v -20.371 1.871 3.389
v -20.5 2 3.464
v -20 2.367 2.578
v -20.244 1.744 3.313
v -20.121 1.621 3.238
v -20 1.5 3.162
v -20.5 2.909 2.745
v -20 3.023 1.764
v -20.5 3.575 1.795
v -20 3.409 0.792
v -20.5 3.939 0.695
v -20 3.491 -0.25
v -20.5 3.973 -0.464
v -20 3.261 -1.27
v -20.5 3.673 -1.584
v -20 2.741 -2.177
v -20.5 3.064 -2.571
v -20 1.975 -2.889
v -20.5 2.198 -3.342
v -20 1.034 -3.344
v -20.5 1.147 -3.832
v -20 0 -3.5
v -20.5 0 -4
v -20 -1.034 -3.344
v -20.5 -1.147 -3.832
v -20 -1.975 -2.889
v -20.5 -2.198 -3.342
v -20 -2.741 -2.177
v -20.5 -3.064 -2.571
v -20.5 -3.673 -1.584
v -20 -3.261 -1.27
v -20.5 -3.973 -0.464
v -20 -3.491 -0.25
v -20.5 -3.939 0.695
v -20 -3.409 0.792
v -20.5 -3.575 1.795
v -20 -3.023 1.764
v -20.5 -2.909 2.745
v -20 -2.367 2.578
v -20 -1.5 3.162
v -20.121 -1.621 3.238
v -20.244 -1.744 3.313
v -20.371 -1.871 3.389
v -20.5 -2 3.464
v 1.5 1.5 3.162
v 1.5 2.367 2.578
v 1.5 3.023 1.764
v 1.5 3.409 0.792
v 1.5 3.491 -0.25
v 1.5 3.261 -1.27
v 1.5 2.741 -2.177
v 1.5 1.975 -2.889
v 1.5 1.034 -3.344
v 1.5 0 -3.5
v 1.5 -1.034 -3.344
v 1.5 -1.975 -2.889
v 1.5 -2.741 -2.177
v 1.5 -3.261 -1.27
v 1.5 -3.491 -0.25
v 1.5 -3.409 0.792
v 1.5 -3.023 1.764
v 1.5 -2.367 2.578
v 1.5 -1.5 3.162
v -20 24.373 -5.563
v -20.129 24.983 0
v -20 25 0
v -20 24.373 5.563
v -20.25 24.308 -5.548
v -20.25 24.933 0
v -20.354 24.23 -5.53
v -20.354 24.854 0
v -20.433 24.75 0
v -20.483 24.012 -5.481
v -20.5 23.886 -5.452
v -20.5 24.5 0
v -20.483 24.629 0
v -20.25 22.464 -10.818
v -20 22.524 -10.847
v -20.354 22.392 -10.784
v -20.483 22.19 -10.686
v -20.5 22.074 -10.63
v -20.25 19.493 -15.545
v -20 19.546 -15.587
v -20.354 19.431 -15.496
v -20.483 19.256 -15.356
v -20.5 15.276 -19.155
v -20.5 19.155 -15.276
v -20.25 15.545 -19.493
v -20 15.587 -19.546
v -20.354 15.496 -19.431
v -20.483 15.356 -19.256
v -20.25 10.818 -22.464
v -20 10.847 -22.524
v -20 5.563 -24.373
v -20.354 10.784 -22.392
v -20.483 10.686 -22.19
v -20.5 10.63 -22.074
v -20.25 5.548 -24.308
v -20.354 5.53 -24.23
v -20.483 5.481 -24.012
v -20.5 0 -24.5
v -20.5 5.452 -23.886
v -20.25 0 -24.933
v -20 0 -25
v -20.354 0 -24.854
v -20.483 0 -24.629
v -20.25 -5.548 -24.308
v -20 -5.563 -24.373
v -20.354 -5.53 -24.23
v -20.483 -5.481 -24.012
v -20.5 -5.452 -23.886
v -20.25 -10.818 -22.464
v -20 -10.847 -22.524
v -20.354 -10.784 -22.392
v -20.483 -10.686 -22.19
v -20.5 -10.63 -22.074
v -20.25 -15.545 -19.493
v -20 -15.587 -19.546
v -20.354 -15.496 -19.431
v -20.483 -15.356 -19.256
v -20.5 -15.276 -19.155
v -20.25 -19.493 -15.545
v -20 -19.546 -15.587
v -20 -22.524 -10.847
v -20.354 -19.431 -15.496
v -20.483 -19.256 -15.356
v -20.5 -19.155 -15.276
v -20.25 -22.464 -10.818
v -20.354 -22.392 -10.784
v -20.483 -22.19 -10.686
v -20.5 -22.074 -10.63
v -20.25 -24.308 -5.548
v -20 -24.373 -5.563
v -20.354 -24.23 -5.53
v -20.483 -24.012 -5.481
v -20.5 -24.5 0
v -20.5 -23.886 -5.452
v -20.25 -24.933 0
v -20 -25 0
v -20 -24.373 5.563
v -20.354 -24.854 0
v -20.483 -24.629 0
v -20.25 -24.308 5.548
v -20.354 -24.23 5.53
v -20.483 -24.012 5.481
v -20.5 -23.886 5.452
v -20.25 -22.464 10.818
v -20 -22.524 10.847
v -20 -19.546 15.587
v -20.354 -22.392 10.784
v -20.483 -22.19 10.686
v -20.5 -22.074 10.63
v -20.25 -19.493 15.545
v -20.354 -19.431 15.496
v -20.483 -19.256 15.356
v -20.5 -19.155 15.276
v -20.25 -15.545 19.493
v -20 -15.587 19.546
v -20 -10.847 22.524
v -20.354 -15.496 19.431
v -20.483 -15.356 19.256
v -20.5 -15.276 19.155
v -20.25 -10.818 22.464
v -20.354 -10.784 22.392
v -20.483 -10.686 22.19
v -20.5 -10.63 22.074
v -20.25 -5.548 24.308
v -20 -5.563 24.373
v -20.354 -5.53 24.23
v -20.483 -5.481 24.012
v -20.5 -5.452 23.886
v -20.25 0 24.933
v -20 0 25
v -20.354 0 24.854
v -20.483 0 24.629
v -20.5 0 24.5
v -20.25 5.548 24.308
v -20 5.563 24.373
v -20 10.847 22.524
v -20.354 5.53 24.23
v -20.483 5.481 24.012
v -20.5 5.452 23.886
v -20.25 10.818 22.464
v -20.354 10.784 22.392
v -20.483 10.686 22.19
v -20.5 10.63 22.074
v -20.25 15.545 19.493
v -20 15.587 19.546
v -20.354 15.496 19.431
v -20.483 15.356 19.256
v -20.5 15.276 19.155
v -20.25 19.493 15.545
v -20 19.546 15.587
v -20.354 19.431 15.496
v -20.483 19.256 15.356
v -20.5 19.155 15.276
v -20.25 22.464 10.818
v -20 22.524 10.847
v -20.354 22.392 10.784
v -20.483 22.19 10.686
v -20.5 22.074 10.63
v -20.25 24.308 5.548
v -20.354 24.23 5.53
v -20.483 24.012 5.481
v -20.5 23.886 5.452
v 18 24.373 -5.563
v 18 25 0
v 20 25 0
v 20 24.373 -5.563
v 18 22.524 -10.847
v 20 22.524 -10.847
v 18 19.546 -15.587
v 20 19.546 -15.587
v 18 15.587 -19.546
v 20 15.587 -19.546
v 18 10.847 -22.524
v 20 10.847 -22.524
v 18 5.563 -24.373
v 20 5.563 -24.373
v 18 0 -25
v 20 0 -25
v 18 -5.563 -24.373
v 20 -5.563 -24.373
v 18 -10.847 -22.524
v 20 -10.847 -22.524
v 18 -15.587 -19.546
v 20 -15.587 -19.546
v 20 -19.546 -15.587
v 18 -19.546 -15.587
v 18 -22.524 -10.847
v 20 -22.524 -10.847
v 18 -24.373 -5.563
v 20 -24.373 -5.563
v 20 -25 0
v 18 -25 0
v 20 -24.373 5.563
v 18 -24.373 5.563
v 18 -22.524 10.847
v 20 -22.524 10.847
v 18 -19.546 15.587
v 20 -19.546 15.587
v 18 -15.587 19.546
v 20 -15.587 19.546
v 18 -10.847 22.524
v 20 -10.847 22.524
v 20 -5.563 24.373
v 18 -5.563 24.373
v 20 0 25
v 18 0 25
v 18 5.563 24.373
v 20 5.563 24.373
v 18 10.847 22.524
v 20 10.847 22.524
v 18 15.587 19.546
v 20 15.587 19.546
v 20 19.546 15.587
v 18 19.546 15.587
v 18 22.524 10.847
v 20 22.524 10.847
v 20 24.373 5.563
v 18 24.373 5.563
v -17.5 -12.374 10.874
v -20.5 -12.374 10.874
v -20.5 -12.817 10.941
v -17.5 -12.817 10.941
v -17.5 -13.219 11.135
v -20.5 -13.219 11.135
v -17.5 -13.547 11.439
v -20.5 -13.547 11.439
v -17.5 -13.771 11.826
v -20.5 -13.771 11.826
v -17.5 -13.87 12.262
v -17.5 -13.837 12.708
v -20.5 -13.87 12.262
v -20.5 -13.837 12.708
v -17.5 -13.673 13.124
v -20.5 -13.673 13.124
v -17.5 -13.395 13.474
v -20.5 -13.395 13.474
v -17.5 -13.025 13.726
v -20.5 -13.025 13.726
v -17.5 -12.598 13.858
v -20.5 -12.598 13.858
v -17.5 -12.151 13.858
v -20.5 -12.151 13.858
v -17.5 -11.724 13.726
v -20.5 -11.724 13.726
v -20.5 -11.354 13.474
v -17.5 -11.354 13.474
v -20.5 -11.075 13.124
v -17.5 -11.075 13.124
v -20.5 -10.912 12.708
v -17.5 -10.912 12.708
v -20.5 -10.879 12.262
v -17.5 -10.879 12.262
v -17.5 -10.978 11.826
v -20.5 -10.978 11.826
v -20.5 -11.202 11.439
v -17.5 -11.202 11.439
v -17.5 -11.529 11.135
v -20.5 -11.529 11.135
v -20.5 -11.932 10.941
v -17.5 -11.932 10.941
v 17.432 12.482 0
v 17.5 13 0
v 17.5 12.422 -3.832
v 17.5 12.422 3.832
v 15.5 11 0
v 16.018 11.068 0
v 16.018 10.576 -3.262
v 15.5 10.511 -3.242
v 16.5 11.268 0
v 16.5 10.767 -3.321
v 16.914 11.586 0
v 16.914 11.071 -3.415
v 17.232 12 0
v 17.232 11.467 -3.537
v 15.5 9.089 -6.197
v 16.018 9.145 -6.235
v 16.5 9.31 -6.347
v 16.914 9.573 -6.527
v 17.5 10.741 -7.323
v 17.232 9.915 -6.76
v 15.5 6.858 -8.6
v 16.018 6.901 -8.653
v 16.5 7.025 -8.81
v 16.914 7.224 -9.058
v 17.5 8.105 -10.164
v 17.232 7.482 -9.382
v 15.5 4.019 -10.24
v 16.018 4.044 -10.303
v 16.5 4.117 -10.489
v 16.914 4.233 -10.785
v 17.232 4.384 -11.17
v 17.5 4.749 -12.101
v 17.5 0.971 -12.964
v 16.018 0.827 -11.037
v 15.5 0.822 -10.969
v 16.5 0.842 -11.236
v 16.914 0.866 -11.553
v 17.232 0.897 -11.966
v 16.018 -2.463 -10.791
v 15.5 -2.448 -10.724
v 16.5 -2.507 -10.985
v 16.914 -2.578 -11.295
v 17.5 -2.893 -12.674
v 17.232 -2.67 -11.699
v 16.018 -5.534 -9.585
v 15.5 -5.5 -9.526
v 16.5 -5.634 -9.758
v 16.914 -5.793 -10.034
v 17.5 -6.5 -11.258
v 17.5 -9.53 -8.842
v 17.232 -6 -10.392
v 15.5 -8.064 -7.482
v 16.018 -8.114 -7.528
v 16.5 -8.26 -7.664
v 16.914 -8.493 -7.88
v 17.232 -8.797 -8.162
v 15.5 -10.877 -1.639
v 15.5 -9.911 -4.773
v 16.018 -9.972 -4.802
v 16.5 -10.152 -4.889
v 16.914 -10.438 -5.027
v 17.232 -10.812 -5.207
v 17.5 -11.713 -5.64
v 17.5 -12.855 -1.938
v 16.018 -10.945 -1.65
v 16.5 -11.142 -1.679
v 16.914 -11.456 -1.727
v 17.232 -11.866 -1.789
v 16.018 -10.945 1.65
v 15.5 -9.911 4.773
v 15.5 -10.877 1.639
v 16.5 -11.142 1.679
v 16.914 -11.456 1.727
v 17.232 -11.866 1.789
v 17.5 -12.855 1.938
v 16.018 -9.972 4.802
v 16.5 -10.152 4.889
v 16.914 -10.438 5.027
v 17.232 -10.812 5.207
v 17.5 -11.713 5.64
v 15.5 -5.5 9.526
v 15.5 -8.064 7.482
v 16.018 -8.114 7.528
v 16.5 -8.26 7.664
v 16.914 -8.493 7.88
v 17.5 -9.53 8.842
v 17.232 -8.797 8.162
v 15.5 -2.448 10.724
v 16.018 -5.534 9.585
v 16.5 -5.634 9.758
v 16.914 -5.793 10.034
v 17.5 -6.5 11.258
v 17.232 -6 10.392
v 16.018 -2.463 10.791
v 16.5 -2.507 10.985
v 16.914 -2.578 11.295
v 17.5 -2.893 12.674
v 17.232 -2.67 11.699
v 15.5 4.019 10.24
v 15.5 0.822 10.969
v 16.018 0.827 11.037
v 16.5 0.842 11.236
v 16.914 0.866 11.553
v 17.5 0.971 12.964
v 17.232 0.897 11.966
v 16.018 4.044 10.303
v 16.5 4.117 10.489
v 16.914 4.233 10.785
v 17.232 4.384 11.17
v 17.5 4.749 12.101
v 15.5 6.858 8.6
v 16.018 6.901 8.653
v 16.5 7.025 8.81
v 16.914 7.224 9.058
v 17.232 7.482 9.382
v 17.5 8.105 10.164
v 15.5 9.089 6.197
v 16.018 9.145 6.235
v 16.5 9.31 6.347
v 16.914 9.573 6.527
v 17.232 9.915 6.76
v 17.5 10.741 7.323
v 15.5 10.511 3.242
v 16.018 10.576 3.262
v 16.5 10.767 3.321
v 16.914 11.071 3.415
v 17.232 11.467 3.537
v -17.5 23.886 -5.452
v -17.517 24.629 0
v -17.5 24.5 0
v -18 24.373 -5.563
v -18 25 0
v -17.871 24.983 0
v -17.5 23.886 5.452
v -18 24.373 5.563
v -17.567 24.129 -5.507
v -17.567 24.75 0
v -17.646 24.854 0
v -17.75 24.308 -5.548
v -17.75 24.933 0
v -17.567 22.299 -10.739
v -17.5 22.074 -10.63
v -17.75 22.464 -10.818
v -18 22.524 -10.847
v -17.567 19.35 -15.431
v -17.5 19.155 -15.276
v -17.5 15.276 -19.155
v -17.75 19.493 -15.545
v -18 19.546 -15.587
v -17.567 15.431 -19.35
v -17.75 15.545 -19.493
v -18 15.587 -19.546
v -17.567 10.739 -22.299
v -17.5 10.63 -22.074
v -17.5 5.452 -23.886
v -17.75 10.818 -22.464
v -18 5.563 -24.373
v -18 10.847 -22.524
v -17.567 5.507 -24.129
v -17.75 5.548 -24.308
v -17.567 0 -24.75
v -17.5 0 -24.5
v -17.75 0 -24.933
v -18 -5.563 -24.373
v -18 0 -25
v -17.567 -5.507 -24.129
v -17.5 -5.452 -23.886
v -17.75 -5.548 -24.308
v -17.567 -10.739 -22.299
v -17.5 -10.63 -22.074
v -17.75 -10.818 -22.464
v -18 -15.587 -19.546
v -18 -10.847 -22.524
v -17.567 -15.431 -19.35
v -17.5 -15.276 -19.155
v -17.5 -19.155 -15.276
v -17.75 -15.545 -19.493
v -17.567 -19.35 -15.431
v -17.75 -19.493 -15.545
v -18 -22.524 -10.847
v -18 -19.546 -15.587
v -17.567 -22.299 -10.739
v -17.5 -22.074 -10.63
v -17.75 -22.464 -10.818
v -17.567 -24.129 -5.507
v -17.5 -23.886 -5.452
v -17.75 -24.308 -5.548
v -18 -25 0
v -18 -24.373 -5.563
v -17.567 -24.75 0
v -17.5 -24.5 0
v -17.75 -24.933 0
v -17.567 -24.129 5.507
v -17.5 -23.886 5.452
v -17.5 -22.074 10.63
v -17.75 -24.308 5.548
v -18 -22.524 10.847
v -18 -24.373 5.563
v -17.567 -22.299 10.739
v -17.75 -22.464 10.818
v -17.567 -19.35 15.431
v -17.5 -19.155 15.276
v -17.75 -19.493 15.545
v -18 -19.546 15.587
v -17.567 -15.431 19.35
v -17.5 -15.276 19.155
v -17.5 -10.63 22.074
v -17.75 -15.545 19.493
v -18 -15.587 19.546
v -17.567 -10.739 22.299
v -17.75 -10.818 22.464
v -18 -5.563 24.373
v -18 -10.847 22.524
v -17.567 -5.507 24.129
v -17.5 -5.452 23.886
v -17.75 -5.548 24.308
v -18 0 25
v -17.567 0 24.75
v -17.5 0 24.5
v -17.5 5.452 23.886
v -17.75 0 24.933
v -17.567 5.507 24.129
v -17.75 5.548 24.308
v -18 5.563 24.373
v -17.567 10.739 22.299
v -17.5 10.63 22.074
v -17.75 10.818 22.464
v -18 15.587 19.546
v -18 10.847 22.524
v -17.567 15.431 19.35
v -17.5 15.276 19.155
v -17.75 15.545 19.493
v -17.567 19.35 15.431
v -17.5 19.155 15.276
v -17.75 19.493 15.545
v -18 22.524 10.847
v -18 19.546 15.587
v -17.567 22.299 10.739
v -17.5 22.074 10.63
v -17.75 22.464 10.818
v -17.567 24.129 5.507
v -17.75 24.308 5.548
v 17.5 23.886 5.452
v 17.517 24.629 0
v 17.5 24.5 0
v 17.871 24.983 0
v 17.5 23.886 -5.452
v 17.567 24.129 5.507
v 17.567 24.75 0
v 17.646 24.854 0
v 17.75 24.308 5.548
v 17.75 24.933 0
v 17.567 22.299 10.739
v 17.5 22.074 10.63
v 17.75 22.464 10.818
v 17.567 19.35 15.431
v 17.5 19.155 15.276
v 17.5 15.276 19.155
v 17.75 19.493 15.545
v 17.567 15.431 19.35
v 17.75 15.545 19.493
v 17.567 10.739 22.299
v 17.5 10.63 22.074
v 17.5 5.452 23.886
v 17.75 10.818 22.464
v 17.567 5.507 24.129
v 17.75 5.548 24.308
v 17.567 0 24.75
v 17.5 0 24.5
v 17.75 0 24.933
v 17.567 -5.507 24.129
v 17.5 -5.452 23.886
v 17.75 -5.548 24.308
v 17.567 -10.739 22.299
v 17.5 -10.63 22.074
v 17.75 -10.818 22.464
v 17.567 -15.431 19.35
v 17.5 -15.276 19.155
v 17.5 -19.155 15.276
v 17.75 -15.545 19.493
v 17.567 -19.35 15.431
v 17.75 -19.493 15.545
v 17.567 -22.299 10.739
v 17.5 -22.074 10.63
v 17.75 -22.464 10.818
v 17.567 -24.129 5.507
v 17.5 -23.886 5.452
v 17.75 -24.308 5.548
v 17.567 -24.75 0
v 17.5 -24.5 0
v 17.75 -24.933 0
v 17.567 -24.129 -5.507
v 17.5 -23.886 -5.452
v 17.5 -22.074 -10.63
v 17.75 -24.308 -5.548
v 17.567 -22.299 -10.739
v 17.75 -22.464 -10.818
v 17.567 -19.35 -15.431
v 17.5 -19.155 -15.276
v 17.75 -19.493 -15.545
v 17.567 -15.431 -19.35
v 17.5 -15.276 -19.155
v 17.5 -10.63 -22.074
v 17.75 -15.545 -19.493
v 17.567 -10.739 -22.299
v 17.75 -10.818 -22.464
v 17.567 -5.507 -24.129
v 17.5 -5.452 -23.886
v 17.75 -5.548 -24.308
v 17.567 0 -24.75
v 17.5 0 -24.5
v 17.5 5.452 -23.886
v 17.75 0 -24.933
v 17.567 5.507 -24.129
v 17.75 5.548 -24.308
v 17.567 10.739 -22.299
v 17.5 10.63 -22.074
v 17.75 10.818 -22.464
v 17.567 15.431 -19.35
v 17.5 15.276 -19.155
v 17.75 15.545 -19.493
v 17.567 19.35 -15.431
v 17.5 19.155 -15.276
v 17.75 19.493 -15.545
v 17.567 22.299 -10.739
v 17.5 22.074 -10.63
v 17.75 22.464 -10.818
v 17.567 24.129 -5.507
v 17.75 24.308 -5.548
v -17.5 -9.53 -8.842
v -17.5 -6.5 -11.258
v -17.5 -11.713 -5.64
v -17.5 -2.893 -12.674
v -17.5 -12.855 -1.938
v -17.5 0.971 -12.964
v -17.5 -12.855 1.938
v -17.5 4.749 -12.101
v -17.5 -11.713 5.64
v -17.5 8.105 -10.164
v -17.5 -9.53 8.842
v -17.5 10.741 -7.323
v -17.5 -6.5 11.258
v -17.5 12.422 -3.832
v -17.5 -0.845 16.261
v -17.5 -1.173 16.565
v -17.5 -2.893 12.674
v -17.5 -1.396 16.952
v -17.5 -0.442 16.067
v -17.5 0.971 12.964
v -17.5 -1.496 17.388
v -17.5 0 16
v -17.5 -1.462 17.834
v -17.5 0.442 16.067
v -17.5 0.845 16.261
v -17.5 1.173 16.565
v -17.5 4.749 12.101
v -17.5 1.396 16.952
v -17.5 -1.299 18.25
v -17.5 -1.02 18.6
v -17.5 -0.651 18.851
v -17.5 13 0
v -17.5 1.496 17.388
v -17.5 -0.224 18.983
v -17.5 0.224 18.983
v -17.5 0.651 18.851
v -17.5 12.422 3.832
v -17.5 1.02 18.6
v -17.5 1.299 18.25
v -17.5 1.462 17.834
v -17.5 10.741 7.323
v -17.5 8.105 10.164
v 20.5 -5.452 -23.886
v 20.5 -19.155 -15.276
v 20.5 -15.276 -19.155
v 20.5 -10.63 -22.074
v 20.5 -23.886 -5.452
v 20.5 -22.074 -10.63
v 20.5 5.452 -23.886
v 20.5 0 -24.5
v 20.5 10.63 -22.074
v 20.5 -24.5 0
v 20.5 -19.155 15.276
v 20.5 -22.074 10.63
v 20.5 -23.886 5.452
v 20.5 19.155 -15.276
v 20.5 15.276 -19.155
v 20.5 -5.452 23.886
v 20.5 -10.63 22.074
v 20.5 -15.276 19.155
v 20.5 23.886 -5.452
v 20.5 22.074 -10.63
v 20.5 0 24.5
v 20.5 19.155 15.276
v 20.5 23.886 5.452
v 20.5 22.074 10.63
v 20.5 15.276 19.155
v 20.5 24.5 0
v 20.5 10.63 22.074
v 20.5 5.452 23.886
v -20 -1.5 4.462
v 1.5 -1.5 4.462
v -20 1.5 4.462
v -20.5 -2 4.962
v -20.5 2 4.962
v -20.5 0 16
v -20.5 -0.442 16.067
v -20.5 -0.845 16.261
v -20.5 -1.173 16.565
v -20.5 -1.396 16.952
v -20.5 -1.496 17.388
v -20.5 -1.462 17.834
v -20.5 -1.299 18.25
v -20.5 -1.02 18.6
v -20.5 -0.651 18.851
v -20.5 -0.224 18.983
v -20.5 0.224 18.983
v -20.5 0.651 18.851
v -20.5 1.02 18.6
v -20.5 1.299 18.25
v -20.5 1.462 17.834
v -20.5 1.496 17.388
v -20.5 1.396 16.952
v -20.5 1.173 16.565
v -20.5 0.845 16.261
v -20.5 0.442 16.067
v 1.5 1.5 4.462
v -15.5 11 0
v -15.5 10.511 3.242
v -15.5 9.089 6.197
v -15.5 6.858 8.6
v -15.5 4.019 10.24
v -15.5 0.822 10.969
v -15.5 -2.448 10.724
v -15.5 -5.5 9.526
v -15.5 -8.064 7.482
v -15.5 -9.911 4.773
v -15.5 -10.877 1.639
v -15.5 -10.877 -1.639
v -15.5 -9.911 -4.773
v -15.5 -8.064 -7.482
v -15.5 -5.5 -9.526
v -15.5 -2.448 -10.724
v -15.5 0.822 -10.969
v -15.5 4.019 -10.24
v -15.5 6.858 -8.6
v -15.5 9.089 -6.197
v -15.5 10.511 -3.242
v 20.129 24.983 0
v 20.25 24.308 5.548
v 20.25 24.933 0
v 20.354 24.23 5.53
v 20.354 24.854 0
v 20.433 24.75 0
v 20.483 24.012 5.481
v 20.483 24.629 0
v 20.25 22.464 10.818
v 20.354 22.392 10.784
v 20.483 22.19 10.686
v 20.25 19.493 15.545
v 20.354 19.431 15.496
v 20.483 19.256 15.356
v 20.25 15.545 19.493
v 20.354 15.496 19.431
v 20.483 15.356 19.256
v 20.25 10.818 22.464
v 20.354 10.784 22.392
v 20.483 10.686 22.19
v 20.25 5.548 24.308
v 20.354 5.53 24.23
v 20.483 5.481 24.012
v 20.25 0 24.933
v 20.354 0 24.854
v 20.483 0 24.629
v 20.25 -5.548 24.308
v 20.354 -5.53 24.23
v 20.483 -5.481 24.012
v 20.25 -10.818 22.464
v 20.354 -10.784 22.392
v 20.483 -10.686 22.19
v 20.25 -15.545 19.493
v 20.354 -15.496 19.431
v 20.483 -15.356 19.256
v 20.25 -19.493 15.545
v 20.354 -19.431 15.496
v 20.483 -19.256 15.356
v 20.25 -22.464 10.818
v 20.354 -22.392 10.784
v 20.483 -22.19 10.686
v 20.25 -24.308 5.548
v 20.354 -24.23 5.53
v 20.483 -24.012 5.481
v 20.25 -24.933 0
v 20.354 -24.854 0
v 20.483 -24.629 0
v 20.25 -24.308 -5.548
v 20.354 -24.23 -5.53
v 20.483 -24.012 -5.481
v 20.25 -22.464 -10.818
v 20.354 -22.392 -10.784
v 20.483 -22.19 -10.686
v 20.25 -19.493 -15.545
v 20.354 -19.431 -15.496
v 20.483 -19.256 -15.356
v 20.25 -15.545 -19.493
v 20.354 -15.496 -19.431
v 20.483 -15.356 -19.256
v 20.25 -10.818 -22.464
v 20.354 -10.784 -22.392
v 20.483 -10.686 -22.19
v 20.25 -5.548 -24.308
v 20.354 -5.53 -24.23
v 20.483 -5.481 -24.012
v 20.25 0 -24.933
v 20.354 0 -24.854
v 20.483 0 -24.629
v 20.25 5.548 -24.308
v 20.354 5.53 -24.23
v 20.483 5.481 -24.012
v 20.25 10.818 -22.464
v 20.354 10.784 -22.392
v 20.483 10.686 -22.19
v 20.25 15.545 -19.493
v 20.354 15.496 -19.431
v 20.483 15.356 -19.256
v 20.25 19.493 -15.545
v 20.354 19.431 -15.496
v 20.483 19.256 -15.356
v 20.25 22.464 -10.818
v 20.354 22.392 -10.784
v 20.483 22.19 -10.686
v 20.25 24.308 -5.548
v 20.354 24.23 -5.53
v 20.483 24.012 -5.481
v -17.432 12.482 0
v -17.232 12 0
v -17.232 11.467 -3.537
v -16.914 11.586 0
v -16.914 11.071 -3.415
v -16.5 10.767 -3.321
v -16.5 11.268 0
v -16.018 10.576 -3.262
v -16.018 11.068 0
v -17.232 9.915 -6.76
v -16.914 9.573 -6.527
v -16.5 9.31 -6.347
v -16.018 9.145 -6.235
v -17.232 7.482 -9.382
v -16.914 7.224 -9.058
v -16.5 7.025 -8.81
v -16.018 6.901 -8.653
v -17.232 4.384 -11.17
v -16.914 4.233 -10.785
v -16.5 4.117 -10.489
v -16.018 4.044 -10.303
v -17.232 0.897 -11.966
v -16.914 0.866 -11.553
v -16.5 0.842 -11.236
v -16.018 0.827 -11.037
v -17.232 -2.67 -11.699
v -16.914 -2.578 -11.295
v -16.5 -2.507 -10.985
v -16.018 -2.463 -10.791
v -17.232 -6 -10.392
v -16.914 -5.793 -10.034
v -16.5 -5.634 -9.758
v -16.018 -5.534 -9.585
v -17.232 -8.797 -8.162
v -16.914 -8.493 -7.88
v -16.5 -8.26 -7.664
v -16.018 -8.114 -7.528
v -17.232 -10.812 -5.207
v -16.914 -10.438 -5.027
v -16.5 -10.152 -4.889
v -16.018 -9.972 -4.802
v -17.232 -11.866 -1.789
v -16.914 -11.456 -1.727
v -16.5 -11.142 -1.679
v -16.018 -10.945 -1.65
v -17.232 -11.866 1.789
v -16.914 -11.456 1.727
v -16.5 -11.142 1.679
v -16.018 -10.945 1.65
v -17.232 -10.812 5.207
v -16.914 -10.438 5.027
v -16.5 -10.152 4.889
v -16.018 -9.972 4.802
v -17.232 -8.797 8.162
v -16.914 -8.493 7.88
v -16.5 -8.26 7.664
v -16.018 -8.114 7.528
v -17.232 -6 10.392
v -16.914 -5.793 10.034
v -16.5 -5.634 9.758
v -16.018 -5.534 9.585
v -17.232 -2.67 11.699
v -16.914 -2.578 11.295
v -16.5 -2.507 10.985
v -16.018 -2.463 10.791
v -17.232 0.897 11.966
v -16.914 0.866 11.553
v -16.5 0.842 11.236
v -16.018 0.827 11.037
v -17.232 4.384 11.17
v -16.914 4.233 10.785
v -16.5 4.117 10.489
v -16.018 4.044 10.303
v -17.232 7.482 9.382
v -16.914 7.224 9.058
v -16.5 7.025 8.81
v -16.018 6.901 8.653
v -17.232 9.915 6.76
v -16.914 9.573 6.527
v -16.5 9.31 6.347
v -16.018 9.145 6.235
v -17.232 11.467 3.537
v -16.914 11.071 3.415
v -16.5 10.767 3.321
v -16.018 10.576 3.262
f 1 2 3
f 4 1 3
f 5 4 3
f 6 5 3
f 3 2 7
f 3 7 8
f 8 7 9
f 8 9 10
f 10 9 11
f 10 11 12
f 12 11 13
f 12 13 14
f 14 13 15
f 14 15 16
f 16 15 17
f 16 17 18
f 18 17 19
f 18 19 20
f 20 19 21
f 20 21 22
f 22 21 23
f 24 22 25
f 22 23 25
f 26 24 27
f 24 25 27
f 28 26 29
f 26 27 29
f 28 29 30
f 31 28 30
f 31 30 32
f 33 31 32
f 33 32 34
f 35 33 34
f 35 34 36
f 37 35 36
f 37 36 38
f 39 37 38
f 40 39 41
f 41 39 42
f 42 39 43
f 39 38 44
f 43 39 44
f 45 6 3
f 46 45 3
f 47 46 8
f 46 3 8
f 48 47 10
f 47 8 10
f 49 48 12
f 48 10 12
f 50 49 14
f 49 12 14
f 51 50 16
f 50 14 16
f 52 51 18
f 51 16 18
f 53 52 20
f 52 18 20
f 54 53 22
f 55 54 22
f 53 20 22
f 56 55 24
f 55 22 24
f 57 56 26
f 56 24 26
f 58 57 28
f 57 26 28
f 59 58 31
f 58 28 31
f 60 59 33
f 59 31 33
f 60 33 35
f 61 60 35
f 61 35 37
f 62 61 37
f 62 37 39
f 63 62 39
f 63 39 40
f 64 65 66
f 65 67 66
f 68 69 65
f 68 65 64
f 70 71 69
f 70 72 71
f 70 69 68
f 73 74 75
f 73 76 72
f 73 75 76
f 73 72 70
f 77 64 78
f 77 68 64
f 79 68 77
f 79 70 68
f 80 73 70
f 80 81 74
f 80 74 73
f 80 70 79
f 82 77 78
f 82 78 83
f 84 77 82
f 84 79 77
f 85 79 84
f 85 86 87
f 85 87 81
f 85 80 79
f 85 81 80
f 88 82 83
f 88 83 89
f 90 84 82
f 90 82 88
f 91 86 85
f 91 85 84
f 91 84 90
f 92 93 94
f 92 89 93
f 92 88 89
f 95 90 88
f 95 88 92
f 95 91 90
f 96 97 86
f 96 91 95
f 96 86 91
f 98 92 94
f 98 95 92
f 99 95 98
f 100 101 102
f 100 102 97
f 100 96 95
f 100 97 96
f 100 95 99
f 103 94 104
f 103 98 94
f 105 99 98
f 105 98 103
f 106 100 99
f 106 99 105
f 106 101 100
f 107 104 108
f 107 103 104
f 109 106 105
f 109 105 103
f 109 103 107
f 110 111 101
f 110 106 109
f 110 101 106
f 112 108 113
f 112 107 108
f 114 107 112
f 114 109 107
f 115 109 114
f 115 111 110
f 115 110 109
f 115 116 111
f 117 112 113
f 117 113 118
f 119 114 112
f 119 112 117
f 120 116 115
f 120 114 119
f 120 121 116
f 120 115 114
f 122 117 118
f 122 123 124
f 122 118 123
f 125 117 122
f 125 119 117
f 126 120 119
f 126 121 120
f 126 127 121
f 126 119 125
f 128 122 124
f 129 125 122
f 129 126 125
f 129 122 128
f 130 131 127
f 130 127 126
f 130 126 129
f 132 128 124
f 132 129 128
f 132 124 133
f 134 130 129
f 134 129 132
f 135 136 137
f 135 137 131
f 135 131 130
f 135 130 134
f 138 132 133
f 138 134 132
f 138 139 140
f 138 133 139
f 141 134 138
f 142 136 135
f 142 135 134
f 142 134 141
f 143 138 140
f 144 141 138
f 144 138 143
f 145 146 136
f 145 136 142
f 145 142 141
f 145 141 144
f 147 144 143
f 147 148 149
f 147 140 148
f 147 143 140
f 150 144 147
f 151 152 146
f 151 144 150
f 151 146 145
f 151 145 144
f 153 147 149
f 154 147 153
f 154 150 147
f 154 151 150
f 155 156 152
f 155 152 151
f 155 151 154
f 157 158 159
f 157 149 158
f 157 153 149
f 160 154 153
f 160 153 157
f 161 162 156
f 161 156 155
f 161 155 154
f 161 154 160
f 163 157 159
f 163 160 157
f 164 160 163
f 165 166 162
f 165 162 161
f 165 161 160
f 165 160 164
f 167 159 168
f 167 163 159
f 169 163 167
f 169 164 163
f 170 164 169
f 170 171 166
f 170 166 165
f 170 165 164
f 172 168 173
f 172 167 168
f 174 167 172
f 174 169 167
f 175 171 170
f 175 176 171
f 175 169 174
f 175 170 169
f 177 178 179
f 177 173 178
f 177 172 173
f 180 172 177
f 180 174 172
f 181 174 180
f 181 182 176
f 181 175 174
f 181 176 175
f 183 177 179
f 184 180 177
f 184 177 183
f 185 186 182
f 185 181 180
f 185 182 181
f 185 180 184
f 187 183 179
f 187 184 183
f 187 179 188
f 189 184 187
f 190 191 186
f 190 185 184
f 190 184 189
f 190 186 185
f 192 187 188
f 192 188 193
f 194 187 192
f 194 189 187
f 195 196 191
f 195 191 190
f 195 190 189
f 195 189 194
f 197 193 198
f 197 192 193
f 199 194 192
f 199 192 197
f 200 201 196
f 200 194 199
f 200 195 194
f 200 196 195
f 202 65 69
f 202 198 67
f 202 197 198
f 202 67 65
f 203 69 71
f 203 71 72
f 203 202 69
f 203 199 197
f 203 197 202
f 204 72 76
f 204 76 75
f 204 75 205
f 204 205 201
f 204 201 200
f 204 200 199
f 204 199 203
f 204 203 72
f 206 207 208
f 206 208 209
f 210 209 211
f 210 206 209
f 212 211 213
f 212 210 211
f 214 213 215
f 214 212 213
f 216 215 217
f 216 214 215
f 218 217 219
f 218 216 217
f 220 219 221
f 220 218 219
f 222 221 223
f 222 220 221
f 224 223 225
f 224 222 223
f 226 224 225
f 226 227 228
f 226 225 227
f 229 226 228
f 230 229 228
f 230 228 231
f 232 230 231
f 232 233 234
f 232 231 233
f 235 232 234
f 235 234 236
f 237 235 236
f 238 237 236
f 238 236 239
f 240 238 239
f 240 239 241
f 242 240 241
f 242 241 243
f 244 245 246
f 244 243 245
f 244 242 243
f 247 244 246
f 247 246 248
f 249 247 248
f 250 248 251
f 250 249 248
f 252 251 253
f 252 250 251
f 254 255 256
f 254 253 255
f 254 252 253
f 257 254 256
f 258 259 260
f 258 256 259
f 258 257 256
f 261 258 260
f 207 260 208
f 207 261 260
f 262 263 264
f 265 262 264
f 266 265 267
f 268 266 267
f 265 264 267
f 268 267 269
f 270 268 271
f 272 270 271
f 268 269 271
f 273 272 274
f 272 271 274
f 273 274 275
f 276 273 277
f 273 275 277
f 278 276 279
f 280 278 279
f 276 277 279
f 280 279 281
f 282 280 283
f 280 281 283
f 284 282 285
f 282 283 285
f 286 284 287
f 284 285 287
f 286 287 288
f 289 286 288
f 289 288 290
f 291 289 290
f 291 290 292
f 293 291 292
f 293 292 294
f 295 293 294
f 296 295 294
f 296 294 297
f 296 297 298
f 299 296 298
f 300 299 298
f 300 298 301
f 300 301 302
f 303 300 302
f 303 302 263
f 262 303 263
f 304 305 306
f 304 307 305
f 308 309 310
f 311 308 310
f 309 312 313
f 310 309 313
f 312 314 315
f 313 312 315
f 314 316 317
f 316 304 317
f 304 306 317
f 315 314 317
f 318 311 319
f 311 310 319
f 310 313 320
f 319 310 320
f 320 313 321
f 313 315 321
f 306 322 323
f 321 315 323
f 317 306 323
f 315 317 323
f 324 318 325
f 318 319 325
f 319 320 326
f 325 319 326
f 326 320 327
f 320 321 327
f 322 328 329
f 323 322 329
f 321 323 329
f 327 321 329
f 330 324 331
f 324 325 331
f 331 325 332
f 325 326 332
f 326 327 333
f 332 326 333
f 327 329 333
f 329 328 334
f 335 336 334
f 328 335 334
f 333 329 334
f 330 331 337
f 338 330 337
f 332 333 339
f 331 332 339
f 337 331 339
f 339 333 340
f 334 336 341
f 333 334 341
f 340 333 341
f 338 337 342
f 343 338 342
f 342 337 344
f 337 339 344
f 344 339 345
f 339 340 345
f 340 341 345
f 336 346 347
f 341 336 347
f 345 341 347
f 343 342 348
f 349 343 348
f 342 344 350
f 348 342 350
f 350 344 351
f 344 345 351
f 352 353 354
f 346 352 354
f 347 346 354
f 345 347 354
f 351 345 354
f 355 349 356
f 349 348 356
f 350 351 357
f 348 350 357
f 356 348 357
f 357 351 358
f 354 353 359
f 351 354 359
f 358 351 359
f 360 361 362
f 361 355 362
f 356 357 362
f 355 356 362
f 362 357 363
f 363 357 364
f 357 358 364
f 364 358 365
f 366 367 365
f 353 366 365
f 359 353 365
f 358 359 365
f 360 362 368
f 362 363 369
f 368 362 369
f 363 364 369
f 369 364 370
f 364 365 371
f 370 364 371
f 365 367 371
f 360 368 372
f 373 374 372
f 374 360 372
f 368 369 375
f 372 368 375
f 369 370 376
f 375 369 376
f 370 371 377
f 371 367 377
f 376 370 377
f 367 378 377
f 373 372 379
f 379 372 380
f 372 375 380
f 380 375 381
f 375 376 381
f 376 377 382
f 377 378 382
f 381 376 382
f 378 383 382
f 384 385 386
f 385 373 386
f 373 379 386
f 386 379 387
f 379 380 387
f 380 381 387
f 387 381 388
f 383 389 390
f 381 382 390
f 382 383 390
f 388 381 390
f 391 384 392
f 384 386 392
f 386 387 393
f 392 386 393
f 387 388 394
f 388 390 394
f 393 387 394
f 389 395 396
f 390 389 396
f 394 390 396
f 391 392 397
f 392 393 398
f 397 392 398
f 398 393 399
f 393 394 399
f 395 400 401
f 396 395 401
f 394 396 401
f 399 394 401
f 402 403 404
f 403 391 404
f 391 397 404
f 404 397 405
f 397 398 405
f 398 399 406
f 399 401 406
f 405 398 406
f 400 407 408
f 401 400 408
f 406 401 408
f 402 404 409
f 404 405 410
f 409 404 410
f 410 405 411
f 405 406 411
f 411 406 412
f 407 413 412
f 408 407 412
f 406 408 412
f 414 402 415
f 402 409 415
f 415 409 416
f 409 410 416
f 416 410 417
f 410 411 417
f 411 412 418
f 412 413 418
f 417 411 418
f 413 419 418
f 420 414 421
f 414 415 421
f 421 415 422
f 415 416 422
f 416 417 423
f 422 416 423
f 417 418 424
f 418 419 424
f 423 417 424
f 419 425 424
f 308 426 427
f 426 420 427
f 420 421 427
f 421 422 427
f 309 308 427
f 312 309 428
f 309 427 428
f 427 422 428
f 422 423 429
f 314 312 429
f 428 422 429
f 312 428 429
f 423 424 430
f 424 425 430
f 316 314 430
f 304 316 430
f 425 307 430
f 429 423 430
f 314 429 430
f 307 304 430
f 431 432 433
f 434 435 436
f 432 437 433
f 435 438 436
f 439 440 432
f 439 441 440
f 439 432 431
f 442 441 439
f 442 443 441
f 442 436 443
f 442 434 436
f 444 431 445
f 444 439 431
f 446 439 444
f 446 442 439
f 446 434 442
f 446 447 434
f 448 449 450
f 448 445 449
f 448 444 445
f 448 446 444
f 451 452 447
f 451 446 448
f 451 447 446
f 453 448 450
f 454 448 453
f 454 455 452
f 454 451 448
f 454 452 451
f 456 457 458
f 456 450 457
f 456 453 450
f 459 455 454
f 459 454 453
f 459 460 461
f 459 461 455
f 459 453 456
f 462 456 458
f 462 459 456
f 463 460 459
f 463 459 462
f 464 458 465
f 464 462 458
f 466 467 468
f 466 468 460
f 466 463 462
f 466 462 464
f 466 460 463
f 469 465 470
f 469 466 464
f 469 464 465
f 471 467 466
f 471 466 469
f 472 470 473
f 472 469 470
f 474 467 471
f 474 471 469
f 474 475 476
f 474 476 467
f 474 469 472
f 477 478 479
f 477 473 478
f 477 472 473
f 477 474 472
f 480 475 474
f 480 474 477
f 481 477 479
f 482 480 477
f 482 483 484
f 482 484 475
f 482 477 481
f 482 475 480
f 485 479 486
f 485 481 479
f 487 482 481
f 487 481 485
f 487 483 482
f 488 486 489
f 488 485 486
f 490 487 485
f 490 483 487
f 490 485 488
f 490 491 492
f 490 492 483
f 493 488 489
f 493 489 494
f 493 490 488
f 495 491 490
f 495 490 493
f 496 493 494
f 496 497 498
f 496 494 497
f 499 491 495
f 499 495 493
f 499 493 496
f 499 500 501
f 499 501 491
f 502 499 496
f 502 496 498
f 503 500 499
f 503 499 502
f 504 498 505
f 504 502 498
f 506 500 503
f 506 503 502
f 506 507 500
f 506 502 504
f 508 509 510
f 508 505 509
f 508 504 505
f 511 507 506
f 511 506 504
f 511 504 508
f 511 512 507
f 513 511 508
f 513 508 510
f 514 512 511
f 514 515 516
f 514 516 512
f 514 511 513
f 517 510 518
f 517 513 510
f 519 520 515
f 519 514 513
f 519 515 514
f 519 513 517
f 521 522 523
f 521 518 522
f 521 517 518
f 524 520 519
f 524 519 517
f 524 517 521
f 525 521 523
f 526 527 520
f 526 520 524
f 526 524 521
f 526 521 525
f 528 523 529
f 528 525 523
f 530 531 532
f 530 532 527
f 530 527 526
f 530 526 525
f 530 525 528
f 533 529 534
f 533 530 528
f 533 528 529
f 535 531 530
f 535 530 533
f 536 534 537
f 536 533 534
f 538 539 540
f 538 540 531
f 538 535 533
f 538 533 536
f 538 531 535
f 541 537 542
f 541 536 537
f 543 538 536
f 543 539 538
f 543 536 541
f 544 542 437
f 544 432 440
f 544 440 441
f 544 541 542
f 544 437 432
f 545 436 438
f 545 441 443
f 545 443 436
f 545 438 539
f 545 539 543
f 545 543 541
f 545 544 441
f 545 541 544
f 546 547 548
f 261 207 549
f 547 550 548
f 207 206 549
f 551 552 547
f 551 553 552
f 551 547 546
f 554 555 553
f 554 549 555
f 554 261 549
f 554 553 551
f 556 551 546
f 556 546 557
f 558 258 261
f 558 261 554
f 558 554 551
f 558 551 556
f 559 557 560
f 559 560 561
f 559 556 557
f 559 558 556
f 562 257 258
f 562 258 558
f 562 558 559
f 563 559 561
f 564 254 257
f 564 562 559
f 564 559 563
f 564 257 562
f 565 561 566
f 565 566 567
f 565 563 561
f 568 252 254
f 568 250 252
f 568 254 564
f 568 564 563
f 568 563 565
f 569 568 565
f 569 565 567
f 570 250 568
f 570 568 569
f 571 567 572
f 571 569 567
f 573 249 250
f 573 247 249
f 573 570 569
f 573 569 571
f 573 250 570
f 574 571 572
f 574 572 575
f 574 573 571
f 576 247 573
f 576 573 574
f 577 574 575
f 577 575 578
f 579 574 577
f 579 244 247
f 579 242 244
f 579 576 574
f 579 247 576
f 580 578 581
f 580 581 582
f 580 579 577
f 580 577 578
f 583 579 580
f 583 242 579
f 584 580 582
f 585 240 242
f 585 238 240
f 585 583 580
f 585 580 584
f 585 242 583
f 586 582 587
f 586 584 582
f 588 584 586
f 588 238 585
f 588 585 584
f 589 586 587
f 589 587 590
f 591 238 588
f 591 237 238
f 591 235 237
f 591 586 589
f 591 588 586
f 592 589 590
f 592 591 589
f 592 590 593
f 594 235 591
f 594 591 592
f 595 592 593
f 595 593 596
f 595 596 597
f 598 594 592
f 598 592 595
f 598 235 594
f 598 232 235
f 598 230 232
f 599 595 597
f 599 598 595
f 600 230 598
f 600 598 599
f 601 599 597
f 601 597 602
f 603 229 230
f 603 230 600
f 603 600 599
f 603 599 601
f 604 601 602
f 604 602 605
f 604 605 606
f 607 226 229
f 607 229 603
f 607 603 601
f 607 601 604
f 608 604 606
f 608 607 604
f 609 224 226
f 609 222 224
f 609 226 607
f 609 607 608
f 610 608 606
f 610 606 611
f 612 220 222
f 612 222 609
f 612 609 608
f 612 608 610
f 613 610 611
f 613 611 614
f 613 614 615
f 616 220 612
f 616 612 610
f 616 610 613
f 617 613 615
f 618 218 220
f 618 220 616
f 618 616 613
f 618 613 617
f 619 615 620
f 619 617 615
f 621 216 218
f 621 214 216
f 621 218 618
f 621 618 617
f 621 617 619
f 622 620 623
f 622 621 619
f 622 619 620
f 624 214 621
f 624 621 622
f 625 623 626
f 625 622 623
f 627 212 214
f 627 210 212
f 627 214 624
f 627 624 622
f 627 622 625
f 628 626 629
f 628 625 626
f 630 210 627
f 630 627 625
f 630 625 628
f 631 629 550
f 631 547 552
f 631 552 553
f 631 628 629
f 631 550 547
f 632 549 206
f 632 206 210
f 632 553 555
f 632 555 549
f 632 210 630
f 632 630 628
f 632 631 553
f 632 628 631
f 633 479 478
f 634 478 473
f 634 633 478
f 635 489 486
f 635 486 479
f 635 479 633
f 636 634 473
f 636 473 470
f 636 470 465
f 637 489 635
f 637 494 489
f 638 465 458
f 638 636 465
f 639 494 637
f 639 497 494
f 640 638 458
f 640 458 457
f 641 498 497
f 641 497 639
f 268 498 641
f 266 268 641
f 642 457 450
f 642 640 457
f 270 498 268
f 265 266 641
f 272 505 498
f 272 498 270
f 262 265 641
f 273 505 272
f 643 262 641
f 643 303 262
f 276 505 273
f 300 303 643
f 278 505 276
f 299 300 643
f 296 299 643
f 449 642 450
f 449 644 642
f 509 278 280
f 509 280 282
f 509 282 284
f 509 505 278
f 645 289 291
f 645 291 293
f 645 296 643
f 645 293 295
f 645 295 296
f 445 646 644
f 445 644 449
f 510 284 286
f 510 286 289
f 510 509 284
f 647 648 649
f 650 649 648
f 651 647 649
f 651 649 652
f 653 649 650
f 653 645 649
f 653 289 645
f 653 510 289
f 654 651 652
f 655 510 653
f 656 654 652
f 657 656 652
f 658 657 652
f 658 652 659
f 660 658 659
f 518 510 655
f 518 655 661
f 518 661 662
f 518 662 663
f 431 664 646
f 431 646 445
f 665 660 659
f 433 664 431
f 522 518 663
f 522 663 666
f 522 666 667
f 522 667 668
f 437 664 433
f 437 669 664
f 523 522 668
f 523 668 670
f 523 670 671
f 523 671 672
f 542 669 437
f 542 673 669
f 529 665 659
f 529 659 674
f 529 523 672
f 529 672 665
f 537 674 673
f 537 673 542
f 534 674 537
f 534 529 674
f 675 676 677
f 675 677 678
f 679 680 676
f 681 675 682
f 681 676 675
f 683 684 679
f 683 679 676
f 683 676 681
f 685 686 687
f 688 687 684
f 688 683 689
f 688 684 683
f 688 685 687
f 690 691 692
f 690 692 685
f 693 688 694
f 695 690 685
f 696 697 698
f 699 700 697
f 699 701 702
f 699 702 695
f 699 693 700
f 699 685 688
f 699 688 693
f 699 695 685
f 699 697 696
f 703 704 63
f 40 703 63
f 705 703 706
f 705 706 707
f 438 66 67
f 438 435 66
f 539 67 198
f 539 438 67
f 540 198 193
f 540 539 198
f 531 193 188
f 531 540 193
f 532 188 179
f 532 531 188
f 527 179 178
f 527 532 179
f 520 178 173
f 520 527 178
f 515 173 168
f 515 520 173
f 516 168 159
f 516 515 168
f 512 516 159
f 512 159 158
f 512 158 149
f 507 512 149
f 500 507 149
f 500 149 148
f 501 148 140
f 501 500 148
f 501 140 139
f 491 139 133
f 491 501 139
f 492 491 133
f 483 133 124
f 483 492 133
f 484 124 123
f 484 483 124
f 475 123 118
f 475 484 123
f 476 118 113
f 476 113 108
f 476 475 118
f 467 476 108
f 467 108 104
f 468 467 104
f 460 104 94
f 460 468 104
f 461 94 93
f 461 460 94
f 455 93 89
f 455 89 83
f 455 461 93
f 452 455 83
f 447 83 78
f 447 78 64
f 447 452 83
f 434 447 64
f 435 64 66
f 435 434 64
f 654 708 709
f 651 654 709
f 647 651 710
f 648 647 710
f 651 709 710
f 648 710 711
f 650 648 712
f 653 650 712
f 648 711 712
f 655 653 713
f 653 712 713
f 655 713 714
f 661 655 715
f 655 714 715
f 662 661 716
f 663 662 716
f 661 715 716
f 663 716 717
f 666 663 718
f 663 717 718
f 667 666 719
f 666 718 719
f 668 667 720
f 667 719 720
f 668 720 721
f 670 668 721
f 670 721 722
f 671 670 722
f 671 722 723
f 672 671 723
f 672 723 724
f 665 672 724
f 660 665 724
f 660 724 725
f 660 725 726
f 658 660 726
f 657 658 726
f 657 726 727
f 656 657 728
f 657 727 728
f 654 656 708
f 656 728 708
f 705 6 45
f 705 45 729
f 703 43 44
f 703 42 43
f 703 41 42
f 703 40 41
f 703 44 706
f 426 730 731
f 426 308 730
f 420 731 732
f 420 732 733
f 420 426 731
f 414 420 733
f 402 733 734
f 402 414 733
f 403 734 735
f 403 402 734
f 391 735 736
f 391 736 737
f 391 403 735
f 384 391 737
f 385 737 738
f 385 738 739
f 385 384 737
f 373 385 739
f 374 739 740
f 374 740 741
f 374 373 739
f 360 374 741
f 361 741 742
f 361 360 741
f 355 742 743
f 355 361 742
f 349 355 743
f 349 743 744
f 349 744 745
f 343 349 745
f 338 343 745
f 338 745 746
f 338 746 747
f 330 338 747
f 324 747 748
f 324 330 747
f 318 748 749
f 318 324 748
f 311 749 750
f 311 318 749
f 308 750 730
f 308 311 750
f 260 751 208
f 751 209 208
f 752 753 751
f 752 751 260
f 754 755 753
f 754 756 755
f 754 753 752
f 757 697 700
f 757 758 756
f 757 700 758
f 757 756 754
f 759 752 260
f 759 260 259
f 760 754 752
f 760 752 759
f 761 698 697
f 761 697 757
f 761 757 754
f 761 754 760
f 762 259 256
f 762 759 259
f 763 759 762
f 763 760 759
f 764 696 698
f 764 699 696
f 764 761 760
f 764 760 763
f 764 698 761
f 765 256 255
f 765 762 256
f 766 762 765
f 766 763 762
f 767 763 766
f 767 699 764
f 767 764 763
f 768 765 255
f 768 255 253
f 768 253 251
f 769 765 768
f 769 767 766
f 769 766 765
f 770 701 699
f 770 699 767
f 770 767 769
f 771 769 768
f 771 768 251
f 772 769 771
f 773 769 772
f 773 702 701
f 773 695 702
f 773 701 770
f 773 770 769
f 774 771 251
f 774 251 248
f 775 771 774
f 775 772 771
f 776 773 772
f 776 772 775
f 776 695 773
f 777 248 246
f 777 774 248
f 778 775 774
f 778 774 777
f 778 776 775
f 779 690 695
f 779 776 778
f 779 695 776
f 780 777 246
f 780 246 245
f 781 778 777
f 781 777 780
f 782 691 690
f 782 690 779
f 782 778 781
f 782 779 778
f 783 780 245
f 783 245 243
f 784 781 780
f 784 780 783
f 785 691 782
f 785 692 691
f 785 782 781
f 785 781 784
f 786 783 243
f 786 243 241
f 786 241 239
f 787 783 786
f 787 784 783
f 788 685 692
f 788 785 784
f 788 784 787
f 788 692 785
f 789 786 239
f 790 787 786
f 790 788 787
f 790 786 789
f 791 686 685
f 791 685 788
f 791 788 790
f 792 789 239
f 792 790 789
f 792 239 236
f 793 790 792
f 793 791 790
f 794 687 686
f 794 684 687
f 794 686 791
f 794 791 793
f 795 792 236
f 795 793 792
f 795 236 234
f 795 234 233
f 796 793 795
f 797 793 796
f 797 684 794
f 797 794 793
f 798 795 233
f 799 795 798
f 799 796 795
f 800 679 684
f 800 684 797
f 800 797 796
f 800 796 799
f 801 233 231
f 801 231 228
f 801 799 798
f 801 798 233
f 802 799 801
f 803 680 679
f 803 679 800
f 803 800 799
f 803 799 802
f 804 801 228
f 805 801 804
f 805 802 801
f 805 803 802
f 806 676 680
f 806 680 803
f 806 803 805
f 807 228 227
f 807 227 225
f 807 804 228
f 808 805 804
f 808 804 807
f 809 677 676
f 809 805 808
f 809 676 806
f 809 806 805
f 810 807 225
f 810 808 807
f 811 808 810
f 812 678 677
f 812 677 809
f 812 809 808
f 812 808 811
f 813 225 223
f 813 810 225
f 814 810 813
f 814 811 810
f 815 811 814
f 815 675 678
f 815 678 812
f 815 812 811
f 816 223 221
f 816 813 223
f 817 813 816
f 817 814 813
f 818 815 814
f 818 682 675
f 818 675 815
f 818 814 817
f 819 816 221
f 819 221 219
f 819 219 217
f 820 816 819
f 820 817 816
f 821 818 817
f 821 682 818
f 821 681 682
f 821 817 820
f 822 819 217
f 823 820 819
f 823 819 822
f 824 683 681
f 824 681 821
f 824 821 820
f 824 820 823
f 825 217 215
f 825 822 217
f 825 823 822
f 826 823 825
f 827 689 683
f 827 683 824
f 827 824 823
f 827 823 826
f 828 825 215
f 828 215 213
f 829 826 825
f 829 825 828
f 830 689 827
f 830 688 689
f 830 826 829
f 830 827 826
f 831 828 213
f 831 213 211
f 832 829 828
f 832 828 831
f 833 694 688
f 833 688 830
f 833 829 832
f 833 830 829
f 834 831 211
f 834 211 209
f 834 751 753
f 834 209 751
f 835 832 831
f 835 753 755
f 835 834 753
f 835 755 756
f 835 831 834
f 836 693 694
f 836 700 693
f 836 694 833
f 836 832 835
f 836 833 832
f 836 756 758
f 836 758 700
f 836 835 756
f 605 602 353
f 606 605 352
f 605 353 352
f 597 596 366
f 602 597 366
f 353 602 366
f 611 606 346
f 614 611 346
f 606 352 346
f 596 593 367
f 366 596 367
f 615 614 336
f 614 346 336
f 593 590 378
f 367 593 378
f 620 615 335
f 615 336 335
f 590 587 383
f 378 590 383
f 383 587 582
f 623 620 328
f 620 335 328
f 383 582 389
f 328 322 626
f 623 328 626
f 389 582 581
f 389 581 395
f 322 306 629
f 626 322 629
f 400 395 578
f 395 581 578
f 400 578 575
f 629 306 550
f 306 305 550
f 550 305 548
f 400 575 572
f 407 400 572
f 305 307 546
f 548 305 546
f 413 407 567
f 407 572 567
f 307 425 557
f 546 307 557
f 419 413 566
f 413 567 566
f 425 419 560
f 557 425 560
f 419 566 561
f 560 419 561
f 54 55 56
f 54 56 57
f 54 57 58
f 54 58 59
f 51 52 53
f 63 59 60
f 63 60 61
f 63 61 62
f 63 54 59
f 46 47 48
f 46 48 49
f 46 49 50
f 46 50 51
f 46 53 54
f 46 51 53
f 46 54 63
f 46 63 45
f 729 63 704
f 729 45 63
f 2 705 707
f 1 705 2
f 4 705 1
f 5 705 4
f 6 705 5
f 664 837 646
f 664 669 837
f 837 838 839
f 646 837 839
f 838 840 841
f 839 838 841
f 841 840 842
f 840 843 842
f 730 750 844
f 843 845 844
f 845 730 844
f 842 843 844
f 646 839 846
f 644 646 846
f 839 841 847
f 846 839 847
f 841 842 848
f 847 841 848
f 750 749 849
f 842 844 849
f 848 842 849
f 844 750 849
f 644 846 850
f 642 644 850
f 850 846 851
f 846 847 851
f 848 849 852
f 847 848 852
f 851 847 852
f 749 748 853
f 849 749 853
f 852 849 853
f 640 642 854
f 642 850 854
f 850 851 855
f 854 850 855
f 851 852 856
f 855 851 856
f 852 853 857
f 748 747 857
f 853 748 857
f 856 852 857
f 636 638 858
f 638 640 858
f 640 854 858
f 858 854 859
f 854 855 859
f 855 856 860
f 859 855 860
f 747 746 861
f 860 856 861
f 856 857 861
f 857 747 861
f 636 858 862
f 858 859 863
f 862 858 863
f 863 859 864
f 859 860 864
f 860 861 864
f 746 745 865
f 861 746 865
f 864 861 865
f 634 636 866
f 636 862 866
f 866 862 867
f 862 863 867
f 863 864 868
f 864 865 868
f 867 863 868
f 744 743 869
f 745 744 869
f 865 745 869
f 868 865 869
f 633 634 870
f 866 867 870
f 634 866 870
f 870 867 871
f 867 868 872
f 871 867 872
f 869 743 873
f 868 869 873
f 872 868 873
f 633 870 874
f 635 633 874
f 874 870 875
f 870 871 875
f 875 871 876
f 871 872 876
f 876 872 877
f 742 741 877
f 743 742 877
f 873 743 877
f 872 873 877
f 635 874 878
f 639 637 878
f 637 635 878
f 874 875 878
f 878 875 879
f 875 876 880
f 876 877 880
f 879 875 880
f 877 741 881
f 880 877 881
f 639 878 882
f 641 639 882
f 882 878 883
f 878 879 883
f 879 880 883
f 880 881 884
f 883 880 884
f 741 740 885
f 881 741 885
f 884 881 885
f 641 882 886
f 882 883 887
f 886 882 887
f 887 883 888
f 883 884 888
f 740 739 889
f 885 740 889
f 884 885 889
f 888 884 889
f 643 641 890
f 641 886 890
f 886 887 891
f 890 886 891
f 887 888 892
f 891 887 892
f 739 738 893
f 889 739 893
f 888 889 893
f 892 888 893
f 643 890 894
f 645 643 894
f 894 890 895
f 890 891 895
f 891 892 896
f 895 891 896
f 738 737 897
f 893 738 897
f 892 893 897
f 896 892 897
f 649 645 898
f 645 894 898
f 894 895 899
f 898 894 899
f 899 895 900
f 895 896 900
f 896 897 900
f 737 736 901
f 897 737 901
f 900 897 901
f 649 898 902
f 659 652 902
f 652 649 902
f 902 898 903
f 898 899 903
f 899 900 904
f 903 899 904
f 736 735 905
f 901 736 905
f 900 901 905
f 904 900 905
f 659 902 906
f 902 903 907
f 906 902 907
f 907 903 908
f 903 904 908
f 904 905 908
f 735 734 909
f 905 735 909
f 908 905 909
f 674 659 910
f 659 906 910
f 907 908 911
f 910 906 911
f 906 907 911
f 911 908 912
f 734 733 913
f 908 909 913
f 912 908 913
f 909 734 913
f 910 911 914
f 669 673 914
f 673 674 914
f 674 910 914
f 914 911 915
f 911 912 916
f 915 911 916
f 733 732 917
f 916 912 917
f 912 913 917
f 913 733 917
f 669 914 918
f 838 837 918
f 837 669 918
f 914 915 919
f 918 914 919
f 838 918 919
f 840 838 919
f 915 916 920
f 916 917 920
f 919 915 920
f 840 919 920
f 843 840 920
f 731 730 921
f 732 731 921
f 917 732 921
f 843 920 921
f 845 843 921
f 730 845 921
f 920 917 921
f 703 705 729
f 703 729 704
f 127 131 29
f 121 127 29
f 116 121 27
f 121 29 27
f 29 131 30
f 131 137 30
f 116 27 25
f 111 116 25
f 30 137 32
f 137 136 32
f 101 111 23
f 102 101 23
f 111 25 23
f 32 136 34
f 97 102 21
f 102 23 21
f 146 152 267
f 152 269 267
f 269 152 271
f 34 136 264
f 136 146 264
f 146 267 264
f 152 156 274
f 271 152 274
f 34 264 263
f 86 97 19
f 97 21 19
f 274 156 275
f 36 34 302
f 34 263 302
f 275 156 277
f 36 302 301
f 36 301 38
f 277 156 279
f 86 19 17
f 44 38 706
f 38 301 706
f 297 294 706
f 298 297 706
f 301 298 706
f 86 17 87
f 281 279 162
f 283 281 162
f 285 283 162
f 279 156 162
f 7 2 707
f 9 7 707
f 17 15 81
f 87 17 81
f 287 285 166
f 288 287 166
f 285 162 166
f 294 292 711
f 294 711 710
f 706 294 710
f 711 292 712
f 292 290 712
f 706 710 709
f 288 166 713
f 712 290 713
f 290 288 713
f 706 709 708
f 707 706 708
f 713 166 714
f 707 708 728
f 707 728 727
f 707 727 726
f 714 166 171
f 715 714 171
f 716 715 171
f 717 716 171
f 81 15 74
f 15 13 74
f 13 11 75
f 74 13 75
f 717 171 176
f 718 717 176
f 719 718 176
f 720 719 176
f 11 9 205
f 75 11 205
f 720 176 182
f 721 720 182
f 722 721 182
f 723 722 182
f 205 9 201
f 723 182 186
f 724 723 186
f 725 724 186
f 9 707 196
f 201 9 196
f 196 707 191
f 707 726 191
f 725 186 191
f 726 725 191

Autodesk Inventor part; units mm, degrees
ref_plane "YZ Plane" through (0, 0, 0) normal (1, 0, 0) x (0, 1, 0)
ref_plane "XZ Plane" through (0, 0, 0) normal (0, 1, 0) x (-1, 0, 0)
ref_plane "XY Plane" through (0, 0, 0) normal (0, 0, 1) x (1, 0, 0)
sketch "Sketch1" plane through (0, 0, 0) normal (0, 0, 1) x (1, 0, 0)
  line L0 (-20.5, 25) -> (-17.5, 25)
  line L1 (-17.5, 25) -> (-17.5, 11)
  line L2 (-17.5, 11) -> (0, 11)
  line L3 (0, 11) -> (0, 0)
  line L4 (0, 0) -> (-20.5, 0)
  line L5 (-20.5, 0) -> (-20.5, 25)
  line L6 (0, 17.0507) -> (0, -8.2074)
  line L7 (20.5, 25) -> (17.5, 25)
  line L8 (17.5, 25) -> (17.5, 11)
  line L9 (17.5, 11) -> (0, 11)
  line L10 (0, 0) -> (20.5, 0)
  line L11 (20.5, 0) -> (20.5, 25)
  dimension "d0" = 3
  dimension "d1" = 11
  dimension "d2" = 25
  dimension "d3" = 17.5
revolve "Revolution1" add sketch "Sketch1" angle 360 about axis through (0, 0, 0) along (1, 0, 0)
sketch "Sketch2" plane through (-17.5, 0, 0) normal (1, 0, 0) x (0, 0, -1)
  circle A0 centre (0, 0) radius 11 projected
  line L0 (0, 0) -> (-17.5, 0)
  line L1 (0, 0) -> (-12.3744, -12.3744)
  dimension "d23" = 17.5
  dimension "d24" = 17.5
  dimension "d25" = 45
hole "Hole1" at (-17.5, 0, 17.5) at (-17.5, -12.3744, 12.3744) direction (-1, 0, 0) diameter 3 depth 3
sketch "Sketch3" plane through (-20.5, 0, 0) normal (-1, 0, 0) x (0, 0, 1)
  circle A0 centre (0, 0) radius 3.5
  line L0 (3.1623, 1.5) -> (4.4623, 1.5)
  line L1 (4.4623, 1.5) -> (4.4623, -1.5)
  line L2 (4.4623, -1.5) -> (3.1623, -1.5)
  line L3 (3.1623, -1.5) -> (3.1623, 1.5)
  point P0 (0, 0)
  dimension "d12" = 7
  dimension "d13" = 3
  dimension "d14" = 1.3
extrude "Extrusion1" cut sketch "Sketch3" against normal blind 22
chamfer "Chamfer1" distance 0.5 angle 45 4 edges at (-20.5, 0, -3.5) (-20.5, 1.5, 3.8123) (-20.5, 0, 4.4623) (-20.5, -1.5, 3.8123)
fillet "Fillet1" radius 2 2 edges at (-17.5, -11, 0) (17.5, -11, 0)
fillet "Fillet2" radius 0.5 4 edges at (-20.5, -25, 0) (-17.5, -25, 0) (17.5, -25, 0) (20.5, -25, 0)
equation "\"d0\" = tedge"
equation "\"d1\" = r1"
equation "\"d2\" = r2"
equation "\"d3\" = 0.5 * win"
equation "\"tedge\" = 3"
equation "\"r1\" = 11"
equation "\"r2\" = 25"
equation "\"win\" = 35"
properties part number "secureingReel" material "Aluminum 6061"
